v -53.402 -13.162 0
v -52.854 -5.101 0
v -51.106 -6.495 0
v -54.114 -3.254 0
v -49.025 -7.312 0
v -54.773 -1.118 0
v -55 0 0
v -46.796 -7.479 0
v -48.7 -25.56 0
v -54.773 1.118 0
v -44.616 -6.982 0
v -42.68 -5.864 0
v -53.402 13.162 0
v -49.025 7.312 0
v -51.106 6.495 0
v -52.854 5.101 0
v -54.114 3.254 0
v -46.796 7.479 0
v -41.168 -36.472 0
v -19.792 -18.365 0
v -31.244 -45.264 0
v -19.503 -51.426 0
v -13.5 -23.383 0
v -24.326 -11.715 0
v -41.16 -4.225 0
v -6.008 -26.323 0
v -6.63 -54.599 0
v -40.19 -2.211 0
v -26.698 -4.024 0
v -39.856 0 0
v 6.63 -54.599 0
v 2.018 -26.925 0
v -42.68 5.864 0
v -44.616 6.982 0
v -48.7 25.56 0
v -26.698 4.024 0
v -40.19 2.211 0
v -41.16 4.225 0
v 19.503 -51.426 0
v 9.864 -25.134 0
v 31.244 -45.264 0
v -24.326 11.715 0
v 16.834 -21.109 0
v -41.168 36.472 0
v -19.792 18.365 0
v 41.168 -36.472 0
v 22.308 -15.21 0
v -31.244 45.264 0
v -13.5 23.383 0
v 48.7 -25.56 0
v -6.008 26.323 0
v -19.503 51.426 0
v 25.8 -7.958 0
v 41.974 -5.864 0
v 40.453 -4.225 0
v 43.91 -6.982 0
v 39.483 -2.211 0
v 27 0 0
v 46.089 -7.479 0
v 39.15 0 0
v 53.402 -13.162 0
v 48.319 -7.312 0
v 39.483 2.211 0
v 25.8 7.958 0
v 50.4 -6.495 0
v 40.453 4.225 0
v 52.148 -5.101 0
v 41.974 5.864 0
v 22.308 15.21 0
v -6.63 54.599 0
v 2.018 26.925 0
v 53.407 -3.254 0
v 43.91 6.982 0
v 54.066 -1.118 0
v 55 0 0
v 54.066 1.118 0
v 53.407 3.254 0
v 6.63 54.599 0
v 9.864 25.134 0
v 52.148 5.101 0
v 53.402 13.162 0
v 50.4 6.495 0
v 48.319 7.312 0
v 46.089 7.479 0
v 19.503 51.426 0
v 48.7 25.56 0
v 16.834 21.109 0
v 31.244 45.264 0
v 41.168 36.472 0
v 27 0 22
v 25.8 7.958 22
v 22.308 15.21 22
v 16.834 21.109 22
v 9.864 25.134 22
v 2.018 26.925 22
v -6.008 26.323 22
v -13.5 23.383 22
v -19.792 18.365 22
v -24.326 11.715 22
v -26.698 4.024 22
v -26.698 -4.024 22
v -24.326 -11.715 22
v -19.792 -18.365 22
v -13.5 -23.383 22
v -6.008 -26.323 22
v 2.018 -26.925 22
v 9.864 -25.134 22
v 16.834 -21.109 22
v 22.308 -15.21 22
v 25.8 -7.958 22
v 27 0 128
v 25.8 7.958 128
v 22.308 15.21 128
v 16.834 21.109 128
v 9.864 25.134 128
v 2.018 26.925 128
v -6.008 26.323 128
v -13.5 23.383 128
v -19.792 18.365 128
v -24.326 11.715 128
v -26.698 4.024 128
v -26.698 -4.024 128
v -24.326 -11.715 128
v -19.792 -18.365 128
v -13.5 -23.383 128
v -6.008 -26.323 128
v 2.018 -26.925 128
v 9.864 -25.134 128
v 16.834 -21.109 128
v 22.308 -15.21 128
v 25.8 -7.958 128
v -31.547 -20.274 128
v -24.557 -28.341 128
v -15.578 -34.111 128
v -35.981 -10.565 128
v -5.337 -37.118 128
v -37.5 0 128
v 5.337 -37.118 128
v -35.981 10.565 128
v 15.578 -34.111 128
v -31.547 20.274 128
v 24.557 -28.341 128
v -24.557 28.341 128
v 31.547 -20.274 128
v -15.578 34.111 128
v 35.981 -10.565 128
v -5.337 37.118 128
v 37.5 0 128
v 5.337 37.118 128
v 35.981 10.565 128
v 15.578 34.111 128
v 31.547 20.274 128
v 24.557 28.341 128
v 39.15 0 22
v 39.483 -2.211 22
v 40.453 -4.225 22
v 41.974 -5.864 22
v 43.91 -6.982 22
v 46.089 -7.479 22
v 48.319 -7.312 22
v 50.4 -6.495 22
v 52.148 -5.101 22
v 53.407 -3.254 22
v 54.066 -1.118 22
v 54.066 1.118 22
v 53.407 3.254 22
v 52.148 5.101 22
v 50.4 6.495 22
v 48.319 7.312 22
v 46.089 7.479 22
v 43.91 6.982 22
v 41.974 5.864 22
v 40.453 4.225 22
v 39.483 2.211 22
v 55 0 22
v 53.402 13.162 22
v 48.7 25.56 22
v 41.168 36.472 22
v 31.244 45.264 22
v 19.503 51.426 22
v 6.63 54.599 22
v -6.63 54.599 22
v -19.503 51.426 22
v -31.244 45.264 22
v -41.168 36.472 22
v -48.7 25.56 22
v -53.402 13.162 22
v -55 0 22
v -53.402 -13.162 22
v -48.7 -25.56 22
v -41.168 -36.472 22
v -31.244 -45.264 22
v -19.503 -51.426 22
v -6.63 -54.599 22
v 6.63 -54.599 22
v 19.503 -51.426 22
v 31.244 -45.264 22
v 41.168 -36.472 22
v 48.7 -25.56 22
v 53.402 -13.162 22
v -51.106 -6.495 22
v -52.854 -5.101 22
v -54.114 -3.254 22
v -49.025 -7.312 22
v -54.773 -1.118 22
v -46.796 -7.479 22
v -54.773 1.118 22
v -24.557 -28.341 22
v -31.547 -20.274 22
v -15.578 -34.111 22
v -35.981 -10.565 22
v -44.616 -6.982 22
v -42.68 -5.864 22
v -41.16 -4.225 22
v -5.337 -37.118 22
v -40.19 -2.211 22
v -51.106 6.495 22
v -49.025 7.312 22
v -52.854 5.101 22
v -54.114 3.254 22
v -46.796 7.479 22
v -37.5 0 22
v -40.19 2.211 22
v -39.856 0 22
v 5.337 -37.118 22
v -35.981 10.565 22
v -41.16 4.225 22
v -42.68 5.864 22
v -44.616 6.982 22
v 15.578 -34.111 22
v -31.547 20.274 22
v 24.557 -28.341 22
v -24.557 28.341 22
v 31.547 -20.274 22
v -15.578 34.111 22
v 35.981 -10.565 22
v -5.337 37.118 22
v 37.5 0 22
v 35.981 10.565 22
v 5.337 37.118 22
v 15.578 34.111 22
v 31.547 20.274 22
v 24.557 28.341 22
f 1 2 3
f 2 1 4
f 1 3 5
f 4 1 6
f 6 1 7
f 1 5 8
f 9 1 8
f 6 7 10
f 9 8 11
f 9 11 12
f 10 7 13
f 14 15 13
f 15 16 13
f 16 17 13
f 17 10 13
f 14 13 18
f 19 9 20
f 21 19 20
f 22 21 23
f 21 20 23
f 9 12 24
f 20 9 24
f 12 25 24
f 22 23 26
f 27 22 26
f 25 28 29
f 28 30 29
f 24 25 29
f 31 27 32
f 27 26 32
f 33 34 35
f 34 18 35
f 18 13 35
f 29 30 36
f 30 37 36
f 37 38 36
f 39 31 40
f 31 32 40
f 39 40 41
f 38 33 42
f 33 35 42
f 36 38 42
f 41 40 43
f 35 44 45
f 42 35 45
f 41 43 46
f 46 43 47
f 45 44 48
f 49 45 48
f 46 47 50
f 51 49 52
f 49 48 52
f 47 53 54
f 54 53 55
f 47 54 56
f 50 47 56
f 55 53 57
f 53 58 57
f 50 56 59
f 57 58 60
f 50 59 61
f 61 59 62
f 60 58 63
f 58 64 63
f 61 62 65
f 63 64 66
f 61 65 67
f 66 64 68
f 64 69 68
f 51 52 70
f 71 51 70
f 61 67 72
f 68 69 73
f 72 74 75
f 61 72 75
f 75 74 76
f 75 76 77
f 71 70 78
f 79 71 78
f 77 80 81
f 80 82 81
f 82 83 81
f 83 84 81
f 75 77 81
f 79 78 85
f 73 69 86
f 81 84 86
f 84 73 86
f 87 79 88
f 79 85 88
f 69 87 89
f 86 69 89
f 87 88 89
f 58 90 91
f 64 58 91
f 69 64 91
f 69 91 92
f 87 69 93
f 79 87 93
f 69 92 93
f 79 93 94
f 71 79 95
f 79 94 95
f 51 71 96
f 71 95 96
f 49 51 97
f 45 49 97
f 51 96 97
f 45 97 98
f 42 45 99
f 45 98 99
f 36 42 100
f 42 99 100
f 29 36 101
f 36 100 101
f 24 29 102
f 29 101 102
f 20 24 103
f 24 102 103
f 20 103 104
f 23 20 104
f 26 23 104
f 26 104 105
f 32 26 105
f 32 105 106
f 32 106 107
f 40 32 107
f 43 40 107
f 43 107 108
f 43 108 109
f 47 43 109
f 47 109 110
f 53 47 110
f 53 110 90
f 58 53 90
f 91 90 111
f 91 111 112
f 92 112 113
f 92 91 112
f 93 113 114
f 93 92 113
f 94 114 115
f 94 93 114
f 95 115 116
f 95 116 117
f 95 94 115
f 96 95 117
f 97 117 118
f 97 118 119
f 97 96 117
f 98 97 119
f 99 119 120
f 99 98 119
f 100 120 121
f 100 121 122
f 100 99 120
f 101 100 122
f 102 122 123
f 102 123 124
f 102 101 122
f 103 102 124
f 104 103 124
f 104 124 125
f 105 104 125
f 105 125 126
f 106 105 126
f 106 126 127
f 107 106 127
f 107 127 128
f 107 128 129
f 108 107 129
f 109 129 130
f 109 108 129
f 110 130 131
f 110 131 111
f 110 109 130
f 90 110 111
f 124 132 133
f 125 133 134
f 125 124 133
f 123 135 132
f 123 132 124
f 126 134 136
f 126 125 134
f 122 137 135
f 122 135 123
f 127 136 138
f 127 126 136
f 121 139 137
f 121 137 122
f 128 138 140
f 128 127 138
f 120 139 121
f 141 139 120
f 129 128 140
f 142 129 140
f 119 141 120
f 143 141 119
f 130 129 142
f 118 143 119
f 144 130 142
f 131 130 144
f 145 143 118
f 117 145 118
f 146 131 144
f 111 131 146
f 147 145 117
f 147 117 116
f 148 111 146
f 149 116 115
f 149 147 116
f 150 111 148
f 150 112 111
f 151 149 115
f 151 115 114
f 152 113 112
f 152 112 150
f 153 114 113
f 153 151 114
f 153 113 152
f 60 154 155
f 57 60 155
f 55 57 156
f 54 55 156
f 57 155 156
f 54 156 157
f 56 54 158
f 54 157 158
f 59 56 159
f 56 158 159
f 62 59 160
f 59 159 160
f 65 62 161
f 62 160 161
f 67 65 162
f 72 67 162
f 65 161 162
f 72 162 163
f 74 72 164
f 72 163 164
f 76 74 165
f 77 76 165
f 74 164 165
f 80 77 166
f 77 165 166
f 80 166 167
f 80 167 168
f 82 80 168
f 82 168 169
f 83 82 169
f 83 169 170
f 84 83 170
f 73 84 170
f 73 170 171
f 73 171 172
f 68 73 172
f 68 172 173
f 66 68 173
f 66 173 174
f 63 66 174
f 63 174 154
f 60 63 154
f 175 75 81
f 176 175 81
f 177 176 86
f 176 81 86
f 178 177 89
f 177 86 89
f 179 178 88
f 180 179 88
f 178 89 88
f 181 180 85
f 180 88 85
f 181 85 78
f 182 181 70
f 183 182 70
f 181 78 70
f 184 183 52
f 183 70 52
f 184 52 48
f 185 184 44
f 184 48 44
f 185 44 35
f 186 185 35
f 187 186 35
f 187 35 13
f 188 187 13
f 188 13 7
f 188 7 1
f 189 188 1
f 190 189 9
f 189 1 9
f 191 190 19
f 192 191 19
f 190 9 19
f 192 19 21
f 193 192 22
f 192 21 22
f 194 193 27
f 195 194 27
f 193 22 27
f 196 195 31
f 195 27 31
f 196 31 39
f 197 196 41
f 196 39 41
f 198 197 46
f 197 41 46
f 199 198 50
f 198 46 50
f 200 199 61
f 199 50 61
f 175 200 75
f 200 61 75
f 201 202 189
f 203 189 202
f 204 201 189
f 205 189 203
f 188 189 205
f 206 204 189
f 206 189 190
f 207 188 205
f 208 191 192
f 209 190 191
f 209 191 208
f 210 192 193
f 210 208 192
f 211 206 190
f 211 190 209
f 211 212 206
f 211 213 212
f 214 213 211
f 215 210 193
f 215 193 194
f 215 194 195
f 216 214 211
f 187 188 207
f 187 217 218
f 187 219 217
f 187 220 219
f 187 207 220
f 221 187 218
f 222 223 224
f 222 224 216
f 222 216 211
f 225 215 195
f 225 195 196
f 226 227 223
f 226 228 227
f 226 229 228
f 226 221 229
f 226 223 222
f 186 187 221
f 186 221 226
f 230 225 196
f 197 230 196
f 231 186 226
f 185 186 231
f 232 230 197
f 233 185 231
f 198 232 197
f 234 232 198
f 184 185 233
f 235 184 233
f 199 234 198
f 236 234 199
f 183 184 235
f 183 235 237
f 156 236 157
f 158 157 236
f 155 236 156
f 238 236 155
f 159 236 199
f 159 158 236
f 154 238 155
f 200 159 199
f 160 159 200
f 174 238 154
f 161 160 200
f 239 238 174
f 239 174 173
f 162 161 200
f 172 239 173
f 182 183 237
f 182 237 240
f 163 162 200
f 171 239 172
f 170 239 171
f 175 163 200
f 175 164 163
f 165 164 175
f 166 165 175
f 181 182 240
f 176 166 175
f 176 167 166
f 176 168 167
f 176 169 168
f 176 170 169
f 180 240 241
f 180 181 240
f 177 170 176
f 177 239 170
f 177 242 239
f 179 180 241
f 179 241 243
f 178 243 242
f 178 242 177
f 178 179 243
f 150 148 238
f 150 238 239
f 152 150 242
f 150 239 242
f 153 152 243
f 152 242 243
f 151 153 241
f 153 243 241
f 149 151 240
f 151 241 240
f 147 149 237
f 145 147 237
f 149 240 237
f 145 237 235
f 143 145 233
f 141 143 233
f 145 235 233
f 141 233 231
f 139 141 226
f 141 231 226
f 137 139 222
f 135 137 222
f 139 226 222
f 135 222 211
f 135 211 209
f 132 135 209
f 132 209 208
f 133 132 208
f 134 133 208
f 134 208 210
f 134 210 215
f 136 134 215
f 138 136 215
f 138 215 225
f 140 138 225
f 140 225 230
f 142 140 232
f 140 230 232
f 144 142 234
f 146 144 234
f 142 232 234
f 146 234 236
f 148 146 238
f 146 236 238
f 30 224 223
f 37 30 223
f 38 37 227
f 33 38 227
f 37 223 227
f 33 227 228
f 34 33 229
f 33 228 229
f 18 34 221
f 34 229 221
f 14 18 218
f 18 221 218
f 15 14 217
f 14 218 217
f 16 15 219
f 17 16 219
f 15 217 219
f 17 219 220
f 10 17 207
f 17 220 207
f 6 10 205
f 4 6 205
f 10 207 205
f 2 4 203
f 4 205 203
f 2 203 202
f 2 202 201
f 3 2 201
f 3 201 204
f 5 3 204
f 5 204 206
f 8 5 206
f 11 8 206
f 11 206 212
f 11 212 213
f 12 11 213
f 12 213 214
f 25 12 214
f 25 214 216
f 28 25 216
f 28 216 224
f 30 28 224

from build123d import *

# Parameters (mm, degrees)
SKETCH_2_R          = 55
EXTRUDE_2_DEPTH     = 22
SKETCH_4_R          = 37.5
SKETCH_4_R_2        = 27
EXTRUDE_3_DEPTH     = 106
CUT_EXTRUDE_1_DEPTH = 132.476233594
SKETCH_6_R          = 27
CUT_EXTRUDE_2_DEPTH = 132.476233594


with BuildPart() as part:
    # 草图2 → 凸台-拉伸2 (new body)
    with BuildSketch(Plane.XY):
        Circle(SKETCH_2_R)
    extrude(amount=EXTRUDE_2_DEPTH)

    # 草图4 → 凸台-拉伸3 (add)
    with BuildSketch(Plane.XY.offset(22)):
        Circle(SKETCH_4_R)
        Circle(SKETCH_4_R_2, mode=Mode.SUBTRACT)
    extrude(amount=EXTRUDE_3_DEPTH)

    # 草图5 → 切除-拉伸1 (cut, through all)
    with BuildSketch(Plane.XY.offset(22)):
        with BuildLine():
            ThreePointArc((-54.856374593, 0), (-47.356374593, -7.5), (-39.856374593, 0))
            Line((-39.856374593, 0), (-54.856374593, 0))
        make_face()
        with BuildLine():
            Line((-54.856374593, 0), (-39.856374593, 0))
            ThreePointArc((-39.856374593, 0), (-47.356374593, 7.5), (-54.856374593, 0))
        make_face()
        with BuildLine():
            ThreePointArc((54.149750432, 0), (46.649750432, 7.5), (39.149750432, 0))
            Line((39.149750432, 0), (54.149750432, 0))
        make_face()
        with BuildLine():
            Line((54.149750432, 0), (39.149750432, 0))
            ThreePointArc((39.149750432, 0), (46.649750432, -7.5), (54.149750432, 0))
        make_face()
    extrude(amount=-CUT_EXTRUDE_1_DEPTH, mode=Mode.SUBTRACT)

    # 草图6 → 切除-拉伸2 (cut, through all)
    with BuildSketch(Plane.XY.offset(22)):
        Circle(SKETCH_6_R)
    extrude(amount=-CUT_EXTRUDE_2_DEPTH, mode=Mode.SUBTRACT)


solid = part.part
